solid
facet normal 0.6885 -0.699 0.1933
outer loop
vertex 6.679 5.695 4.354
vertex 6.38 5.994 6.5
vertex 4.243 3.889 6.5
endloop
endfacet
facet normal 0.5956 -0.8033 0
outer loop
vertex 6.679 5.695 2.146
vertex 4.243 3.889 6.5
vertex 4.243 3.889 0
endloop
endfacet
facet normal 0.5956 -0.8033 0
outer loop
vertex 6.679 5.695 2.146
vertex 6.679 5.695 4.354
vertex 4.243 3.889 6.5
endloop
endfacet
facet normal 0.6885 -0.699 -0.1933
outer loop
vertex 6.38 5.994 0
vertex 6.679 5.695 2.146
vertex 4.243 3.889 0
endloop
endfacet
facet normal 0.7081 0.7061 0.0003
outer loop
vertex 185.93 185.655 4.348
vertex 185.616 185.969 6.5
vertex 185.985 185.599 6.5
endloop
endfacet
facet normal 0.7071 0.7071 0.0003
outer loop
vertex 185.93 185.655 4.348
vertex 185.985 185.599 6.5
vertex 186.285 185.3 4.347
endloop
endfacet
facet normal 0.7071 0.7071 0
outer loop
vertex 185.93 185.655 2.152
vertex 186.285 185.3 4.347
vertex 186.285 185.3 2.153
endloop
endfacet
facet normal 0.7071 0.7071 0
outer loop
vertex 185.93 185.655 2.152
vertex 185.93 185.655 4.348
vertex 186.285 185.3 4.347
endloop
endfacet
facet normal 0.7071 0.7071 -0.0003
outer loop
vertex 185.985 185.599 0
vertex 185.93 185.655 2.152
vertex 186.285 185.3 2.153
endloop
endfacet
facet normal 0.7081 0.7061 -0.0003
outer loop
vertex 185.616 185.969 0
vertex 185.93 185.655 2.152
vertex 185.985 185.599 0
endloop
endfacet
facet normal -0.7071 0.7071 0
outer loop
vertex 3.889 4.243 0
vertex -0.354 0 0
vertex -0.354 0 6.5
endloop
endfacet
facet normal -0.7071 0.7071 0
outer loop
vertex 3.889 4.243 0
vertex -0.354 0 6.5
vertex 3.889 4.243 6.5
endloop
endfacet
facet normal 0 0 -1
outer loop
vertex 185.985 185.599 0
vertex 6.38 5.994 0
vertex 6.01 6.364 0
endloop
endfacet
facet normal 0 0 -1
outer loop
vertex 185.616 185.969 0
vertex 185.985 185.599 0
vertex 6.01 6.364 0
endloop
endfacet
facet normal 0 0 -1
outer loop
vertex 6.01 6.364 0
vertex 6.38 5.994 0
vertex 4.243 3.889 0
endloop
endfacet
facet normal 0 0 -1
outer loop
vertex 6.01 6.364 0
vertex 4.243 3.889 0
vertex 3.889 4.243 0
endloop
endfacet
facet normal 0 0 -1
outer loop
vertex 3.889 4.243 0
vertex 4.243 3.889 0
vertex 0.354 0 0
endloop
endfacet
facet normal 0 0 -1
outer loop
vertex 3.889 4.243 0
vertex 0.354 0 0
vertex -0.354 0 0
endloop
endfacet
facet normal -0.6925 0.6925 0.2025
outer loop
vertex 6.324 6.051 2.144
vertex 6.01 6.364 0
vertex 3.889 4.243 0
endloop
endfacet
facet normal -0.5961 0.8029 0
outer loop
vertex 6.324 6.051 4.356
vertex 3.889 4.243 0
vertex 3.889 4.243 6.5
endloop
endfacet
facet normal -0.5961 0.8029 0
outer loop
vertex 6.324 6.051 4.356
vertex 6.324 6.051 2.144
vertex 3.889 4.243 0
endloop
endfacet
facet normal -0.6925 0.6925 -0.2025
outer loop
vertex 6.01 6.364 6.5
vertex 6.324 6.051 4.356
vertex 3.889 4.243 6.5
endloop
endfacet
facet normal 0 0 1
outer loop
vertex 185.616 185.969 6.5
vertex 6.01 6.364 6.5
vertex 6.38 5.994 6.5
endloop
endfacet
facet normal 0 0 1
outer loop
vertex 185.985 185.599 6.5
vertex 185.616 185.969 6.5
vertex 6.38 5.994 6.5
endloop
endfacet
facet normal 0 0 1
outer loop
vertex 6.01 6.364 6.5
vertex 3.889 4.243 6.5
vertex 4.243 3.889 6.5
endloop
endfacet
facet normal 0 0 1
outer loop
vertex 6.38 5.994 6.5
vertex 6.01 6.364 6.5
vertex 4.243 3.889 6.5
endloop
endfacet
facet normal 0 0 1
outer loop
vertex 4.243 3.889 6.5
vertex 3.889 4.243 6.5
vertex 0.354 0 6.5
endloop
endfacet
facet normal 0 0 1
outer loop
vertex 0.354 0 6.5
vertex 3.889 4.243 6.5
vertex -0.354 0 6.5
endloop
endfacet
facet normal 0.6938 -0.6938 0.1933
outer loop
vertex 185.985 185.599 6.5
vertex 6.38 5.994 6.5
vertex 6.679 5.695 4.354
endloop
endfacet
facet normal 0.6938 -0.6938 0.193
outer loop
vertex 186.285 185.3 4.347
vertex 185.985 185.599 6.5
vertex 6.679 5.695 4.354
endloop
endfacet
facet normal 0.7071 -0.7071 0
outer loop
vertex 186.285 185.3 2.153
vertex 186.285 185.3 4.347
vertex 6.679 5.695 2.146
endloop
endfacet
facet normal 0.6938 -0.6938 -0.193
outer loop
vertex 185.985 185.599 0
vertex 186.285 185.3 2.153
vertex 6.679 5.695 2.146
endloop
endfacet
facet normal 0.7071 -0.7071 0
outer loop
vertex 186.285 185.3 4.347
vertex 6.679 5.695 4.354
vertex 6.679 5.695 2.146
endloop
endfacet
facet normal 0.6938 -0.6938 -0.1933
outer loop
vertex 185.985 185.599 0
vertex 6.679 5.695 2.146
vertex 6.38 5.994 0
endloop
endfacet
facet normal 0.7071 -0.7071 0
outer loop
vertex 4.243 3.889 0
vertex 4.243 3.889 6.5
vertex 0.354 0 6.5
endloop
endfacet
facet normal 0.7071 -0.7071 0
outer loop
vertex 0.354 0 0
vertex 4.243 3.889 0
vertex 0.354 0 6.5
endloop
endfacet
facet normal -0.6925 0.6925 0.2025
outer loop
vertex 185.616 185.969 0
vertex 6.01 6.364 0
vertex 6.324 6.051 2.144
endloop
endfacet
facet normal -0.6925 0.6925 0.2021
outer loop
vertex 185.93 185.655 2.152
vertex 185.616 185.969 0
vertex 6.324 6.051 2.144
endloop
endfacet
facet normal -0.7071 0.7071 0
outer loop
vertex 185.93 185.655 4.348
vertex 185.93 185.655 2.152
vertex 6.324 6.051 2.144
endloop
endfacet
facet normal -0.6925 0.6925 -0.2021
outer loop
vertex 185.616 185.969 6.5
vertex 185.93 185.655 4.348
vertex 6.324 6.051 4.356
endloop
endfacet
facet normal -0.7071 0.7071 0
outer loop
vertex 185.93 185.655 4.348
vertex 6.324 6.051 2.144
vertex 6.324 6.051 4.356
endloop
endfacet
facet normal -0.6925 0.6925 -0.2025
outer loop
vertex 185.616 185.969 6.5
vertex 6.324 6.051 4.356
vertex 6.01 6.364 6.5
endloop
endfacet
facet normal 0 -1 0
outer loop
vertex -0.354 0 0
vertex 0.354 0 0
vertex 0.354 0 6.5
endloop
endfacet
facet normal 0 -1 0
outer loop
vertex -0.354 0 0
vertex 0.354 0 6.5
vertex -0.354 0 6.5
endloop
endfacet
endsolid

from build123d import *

# Parameters (mm, degrees)
BOSS_EXTRUDE1_DEPTH = 6.5
BOSS_EXTRUDE4_DEPTH = 254


with BuildPart() as part:
    # Sketch1 → Boss-Extrude1 (new body)
    with BuildSketch(Plane.XY):
        Polygon((0.353553391, 0), (-0.353553391, 0), (3.889087297, 4.242640687), (4.242640687, 3.889087297), align=None)
    extrude(amount=BOSS_EXTRUDE1_DEPTH)

    # Sketch2 → Loft1 section 0
    with BuildSketch(Plane(origin=(4.065863992, 4.065863992, 0), x_dir=(0, 0, -1), z_dir=(0.707106781186551, 0.7071067811865441, 0))):
        with BuildLine():
            Line((0, -0.25), (0, 0.25))
            Line((0, 0.25), (-6.5, 0.25))
            Line((-6.5, 0.25), (-6.5, -0.25))
            Line((-6.5, -0.25), (0, -0.25))
        make_face()
    # Sketch3 for Loft1 → Loft1 section 1
    with BuildSketch(Plane(origin=(6.187184335, 6.187184335, 0), x_dir=(0, 0, -1), z_dir=(0.7071067811865509, 0.7071067811865441, 0))):
        with BuildLine():
            Line((-6.5, 0.25), (-6.5, -0.273096719))
            # circular arc as an exact rational Bezier (weights 1, cos(half-angle), 1)
            Bezier((-6.5, -0.273096719), (-3.25, -1.247893057), (0, -0.273096719), weights=[1, 0.957842804, 1])
            Line((0, -0.273096719), (0, 0.25))
            Bezier((0, 0.25), (-3.25, -0.774242424), (-6.5, 0.25), weights=[1, 0.953757225, 1])
        make_face()
    loft()

    # Sketch6 → Boss-Extrude4 (add)
    with BuildSketch(Plane(origin=(6.187184335, 6.187184335, 0), x_dir=(0, 0, -1), z_dir=(0.7071067811865509, 0.7071067811865441, 0))):
        with BuildLine():
            Line((-6.5, 0.25), (-6.5, -0.273096719))
            ThreePointArc((-6.5, -0.273096719), (-3.25, -0.75), (0, -0.273096719))
            Line((0, -0.273096719), (0, 0.25))
            ThreePointArc((0, 0.25), (-3.25, -0.25), (-6.5, 0.25))
        make_face()
    extrude(amount=BOSS_EXTRUDE4_DEPTH)


solid = part.part
